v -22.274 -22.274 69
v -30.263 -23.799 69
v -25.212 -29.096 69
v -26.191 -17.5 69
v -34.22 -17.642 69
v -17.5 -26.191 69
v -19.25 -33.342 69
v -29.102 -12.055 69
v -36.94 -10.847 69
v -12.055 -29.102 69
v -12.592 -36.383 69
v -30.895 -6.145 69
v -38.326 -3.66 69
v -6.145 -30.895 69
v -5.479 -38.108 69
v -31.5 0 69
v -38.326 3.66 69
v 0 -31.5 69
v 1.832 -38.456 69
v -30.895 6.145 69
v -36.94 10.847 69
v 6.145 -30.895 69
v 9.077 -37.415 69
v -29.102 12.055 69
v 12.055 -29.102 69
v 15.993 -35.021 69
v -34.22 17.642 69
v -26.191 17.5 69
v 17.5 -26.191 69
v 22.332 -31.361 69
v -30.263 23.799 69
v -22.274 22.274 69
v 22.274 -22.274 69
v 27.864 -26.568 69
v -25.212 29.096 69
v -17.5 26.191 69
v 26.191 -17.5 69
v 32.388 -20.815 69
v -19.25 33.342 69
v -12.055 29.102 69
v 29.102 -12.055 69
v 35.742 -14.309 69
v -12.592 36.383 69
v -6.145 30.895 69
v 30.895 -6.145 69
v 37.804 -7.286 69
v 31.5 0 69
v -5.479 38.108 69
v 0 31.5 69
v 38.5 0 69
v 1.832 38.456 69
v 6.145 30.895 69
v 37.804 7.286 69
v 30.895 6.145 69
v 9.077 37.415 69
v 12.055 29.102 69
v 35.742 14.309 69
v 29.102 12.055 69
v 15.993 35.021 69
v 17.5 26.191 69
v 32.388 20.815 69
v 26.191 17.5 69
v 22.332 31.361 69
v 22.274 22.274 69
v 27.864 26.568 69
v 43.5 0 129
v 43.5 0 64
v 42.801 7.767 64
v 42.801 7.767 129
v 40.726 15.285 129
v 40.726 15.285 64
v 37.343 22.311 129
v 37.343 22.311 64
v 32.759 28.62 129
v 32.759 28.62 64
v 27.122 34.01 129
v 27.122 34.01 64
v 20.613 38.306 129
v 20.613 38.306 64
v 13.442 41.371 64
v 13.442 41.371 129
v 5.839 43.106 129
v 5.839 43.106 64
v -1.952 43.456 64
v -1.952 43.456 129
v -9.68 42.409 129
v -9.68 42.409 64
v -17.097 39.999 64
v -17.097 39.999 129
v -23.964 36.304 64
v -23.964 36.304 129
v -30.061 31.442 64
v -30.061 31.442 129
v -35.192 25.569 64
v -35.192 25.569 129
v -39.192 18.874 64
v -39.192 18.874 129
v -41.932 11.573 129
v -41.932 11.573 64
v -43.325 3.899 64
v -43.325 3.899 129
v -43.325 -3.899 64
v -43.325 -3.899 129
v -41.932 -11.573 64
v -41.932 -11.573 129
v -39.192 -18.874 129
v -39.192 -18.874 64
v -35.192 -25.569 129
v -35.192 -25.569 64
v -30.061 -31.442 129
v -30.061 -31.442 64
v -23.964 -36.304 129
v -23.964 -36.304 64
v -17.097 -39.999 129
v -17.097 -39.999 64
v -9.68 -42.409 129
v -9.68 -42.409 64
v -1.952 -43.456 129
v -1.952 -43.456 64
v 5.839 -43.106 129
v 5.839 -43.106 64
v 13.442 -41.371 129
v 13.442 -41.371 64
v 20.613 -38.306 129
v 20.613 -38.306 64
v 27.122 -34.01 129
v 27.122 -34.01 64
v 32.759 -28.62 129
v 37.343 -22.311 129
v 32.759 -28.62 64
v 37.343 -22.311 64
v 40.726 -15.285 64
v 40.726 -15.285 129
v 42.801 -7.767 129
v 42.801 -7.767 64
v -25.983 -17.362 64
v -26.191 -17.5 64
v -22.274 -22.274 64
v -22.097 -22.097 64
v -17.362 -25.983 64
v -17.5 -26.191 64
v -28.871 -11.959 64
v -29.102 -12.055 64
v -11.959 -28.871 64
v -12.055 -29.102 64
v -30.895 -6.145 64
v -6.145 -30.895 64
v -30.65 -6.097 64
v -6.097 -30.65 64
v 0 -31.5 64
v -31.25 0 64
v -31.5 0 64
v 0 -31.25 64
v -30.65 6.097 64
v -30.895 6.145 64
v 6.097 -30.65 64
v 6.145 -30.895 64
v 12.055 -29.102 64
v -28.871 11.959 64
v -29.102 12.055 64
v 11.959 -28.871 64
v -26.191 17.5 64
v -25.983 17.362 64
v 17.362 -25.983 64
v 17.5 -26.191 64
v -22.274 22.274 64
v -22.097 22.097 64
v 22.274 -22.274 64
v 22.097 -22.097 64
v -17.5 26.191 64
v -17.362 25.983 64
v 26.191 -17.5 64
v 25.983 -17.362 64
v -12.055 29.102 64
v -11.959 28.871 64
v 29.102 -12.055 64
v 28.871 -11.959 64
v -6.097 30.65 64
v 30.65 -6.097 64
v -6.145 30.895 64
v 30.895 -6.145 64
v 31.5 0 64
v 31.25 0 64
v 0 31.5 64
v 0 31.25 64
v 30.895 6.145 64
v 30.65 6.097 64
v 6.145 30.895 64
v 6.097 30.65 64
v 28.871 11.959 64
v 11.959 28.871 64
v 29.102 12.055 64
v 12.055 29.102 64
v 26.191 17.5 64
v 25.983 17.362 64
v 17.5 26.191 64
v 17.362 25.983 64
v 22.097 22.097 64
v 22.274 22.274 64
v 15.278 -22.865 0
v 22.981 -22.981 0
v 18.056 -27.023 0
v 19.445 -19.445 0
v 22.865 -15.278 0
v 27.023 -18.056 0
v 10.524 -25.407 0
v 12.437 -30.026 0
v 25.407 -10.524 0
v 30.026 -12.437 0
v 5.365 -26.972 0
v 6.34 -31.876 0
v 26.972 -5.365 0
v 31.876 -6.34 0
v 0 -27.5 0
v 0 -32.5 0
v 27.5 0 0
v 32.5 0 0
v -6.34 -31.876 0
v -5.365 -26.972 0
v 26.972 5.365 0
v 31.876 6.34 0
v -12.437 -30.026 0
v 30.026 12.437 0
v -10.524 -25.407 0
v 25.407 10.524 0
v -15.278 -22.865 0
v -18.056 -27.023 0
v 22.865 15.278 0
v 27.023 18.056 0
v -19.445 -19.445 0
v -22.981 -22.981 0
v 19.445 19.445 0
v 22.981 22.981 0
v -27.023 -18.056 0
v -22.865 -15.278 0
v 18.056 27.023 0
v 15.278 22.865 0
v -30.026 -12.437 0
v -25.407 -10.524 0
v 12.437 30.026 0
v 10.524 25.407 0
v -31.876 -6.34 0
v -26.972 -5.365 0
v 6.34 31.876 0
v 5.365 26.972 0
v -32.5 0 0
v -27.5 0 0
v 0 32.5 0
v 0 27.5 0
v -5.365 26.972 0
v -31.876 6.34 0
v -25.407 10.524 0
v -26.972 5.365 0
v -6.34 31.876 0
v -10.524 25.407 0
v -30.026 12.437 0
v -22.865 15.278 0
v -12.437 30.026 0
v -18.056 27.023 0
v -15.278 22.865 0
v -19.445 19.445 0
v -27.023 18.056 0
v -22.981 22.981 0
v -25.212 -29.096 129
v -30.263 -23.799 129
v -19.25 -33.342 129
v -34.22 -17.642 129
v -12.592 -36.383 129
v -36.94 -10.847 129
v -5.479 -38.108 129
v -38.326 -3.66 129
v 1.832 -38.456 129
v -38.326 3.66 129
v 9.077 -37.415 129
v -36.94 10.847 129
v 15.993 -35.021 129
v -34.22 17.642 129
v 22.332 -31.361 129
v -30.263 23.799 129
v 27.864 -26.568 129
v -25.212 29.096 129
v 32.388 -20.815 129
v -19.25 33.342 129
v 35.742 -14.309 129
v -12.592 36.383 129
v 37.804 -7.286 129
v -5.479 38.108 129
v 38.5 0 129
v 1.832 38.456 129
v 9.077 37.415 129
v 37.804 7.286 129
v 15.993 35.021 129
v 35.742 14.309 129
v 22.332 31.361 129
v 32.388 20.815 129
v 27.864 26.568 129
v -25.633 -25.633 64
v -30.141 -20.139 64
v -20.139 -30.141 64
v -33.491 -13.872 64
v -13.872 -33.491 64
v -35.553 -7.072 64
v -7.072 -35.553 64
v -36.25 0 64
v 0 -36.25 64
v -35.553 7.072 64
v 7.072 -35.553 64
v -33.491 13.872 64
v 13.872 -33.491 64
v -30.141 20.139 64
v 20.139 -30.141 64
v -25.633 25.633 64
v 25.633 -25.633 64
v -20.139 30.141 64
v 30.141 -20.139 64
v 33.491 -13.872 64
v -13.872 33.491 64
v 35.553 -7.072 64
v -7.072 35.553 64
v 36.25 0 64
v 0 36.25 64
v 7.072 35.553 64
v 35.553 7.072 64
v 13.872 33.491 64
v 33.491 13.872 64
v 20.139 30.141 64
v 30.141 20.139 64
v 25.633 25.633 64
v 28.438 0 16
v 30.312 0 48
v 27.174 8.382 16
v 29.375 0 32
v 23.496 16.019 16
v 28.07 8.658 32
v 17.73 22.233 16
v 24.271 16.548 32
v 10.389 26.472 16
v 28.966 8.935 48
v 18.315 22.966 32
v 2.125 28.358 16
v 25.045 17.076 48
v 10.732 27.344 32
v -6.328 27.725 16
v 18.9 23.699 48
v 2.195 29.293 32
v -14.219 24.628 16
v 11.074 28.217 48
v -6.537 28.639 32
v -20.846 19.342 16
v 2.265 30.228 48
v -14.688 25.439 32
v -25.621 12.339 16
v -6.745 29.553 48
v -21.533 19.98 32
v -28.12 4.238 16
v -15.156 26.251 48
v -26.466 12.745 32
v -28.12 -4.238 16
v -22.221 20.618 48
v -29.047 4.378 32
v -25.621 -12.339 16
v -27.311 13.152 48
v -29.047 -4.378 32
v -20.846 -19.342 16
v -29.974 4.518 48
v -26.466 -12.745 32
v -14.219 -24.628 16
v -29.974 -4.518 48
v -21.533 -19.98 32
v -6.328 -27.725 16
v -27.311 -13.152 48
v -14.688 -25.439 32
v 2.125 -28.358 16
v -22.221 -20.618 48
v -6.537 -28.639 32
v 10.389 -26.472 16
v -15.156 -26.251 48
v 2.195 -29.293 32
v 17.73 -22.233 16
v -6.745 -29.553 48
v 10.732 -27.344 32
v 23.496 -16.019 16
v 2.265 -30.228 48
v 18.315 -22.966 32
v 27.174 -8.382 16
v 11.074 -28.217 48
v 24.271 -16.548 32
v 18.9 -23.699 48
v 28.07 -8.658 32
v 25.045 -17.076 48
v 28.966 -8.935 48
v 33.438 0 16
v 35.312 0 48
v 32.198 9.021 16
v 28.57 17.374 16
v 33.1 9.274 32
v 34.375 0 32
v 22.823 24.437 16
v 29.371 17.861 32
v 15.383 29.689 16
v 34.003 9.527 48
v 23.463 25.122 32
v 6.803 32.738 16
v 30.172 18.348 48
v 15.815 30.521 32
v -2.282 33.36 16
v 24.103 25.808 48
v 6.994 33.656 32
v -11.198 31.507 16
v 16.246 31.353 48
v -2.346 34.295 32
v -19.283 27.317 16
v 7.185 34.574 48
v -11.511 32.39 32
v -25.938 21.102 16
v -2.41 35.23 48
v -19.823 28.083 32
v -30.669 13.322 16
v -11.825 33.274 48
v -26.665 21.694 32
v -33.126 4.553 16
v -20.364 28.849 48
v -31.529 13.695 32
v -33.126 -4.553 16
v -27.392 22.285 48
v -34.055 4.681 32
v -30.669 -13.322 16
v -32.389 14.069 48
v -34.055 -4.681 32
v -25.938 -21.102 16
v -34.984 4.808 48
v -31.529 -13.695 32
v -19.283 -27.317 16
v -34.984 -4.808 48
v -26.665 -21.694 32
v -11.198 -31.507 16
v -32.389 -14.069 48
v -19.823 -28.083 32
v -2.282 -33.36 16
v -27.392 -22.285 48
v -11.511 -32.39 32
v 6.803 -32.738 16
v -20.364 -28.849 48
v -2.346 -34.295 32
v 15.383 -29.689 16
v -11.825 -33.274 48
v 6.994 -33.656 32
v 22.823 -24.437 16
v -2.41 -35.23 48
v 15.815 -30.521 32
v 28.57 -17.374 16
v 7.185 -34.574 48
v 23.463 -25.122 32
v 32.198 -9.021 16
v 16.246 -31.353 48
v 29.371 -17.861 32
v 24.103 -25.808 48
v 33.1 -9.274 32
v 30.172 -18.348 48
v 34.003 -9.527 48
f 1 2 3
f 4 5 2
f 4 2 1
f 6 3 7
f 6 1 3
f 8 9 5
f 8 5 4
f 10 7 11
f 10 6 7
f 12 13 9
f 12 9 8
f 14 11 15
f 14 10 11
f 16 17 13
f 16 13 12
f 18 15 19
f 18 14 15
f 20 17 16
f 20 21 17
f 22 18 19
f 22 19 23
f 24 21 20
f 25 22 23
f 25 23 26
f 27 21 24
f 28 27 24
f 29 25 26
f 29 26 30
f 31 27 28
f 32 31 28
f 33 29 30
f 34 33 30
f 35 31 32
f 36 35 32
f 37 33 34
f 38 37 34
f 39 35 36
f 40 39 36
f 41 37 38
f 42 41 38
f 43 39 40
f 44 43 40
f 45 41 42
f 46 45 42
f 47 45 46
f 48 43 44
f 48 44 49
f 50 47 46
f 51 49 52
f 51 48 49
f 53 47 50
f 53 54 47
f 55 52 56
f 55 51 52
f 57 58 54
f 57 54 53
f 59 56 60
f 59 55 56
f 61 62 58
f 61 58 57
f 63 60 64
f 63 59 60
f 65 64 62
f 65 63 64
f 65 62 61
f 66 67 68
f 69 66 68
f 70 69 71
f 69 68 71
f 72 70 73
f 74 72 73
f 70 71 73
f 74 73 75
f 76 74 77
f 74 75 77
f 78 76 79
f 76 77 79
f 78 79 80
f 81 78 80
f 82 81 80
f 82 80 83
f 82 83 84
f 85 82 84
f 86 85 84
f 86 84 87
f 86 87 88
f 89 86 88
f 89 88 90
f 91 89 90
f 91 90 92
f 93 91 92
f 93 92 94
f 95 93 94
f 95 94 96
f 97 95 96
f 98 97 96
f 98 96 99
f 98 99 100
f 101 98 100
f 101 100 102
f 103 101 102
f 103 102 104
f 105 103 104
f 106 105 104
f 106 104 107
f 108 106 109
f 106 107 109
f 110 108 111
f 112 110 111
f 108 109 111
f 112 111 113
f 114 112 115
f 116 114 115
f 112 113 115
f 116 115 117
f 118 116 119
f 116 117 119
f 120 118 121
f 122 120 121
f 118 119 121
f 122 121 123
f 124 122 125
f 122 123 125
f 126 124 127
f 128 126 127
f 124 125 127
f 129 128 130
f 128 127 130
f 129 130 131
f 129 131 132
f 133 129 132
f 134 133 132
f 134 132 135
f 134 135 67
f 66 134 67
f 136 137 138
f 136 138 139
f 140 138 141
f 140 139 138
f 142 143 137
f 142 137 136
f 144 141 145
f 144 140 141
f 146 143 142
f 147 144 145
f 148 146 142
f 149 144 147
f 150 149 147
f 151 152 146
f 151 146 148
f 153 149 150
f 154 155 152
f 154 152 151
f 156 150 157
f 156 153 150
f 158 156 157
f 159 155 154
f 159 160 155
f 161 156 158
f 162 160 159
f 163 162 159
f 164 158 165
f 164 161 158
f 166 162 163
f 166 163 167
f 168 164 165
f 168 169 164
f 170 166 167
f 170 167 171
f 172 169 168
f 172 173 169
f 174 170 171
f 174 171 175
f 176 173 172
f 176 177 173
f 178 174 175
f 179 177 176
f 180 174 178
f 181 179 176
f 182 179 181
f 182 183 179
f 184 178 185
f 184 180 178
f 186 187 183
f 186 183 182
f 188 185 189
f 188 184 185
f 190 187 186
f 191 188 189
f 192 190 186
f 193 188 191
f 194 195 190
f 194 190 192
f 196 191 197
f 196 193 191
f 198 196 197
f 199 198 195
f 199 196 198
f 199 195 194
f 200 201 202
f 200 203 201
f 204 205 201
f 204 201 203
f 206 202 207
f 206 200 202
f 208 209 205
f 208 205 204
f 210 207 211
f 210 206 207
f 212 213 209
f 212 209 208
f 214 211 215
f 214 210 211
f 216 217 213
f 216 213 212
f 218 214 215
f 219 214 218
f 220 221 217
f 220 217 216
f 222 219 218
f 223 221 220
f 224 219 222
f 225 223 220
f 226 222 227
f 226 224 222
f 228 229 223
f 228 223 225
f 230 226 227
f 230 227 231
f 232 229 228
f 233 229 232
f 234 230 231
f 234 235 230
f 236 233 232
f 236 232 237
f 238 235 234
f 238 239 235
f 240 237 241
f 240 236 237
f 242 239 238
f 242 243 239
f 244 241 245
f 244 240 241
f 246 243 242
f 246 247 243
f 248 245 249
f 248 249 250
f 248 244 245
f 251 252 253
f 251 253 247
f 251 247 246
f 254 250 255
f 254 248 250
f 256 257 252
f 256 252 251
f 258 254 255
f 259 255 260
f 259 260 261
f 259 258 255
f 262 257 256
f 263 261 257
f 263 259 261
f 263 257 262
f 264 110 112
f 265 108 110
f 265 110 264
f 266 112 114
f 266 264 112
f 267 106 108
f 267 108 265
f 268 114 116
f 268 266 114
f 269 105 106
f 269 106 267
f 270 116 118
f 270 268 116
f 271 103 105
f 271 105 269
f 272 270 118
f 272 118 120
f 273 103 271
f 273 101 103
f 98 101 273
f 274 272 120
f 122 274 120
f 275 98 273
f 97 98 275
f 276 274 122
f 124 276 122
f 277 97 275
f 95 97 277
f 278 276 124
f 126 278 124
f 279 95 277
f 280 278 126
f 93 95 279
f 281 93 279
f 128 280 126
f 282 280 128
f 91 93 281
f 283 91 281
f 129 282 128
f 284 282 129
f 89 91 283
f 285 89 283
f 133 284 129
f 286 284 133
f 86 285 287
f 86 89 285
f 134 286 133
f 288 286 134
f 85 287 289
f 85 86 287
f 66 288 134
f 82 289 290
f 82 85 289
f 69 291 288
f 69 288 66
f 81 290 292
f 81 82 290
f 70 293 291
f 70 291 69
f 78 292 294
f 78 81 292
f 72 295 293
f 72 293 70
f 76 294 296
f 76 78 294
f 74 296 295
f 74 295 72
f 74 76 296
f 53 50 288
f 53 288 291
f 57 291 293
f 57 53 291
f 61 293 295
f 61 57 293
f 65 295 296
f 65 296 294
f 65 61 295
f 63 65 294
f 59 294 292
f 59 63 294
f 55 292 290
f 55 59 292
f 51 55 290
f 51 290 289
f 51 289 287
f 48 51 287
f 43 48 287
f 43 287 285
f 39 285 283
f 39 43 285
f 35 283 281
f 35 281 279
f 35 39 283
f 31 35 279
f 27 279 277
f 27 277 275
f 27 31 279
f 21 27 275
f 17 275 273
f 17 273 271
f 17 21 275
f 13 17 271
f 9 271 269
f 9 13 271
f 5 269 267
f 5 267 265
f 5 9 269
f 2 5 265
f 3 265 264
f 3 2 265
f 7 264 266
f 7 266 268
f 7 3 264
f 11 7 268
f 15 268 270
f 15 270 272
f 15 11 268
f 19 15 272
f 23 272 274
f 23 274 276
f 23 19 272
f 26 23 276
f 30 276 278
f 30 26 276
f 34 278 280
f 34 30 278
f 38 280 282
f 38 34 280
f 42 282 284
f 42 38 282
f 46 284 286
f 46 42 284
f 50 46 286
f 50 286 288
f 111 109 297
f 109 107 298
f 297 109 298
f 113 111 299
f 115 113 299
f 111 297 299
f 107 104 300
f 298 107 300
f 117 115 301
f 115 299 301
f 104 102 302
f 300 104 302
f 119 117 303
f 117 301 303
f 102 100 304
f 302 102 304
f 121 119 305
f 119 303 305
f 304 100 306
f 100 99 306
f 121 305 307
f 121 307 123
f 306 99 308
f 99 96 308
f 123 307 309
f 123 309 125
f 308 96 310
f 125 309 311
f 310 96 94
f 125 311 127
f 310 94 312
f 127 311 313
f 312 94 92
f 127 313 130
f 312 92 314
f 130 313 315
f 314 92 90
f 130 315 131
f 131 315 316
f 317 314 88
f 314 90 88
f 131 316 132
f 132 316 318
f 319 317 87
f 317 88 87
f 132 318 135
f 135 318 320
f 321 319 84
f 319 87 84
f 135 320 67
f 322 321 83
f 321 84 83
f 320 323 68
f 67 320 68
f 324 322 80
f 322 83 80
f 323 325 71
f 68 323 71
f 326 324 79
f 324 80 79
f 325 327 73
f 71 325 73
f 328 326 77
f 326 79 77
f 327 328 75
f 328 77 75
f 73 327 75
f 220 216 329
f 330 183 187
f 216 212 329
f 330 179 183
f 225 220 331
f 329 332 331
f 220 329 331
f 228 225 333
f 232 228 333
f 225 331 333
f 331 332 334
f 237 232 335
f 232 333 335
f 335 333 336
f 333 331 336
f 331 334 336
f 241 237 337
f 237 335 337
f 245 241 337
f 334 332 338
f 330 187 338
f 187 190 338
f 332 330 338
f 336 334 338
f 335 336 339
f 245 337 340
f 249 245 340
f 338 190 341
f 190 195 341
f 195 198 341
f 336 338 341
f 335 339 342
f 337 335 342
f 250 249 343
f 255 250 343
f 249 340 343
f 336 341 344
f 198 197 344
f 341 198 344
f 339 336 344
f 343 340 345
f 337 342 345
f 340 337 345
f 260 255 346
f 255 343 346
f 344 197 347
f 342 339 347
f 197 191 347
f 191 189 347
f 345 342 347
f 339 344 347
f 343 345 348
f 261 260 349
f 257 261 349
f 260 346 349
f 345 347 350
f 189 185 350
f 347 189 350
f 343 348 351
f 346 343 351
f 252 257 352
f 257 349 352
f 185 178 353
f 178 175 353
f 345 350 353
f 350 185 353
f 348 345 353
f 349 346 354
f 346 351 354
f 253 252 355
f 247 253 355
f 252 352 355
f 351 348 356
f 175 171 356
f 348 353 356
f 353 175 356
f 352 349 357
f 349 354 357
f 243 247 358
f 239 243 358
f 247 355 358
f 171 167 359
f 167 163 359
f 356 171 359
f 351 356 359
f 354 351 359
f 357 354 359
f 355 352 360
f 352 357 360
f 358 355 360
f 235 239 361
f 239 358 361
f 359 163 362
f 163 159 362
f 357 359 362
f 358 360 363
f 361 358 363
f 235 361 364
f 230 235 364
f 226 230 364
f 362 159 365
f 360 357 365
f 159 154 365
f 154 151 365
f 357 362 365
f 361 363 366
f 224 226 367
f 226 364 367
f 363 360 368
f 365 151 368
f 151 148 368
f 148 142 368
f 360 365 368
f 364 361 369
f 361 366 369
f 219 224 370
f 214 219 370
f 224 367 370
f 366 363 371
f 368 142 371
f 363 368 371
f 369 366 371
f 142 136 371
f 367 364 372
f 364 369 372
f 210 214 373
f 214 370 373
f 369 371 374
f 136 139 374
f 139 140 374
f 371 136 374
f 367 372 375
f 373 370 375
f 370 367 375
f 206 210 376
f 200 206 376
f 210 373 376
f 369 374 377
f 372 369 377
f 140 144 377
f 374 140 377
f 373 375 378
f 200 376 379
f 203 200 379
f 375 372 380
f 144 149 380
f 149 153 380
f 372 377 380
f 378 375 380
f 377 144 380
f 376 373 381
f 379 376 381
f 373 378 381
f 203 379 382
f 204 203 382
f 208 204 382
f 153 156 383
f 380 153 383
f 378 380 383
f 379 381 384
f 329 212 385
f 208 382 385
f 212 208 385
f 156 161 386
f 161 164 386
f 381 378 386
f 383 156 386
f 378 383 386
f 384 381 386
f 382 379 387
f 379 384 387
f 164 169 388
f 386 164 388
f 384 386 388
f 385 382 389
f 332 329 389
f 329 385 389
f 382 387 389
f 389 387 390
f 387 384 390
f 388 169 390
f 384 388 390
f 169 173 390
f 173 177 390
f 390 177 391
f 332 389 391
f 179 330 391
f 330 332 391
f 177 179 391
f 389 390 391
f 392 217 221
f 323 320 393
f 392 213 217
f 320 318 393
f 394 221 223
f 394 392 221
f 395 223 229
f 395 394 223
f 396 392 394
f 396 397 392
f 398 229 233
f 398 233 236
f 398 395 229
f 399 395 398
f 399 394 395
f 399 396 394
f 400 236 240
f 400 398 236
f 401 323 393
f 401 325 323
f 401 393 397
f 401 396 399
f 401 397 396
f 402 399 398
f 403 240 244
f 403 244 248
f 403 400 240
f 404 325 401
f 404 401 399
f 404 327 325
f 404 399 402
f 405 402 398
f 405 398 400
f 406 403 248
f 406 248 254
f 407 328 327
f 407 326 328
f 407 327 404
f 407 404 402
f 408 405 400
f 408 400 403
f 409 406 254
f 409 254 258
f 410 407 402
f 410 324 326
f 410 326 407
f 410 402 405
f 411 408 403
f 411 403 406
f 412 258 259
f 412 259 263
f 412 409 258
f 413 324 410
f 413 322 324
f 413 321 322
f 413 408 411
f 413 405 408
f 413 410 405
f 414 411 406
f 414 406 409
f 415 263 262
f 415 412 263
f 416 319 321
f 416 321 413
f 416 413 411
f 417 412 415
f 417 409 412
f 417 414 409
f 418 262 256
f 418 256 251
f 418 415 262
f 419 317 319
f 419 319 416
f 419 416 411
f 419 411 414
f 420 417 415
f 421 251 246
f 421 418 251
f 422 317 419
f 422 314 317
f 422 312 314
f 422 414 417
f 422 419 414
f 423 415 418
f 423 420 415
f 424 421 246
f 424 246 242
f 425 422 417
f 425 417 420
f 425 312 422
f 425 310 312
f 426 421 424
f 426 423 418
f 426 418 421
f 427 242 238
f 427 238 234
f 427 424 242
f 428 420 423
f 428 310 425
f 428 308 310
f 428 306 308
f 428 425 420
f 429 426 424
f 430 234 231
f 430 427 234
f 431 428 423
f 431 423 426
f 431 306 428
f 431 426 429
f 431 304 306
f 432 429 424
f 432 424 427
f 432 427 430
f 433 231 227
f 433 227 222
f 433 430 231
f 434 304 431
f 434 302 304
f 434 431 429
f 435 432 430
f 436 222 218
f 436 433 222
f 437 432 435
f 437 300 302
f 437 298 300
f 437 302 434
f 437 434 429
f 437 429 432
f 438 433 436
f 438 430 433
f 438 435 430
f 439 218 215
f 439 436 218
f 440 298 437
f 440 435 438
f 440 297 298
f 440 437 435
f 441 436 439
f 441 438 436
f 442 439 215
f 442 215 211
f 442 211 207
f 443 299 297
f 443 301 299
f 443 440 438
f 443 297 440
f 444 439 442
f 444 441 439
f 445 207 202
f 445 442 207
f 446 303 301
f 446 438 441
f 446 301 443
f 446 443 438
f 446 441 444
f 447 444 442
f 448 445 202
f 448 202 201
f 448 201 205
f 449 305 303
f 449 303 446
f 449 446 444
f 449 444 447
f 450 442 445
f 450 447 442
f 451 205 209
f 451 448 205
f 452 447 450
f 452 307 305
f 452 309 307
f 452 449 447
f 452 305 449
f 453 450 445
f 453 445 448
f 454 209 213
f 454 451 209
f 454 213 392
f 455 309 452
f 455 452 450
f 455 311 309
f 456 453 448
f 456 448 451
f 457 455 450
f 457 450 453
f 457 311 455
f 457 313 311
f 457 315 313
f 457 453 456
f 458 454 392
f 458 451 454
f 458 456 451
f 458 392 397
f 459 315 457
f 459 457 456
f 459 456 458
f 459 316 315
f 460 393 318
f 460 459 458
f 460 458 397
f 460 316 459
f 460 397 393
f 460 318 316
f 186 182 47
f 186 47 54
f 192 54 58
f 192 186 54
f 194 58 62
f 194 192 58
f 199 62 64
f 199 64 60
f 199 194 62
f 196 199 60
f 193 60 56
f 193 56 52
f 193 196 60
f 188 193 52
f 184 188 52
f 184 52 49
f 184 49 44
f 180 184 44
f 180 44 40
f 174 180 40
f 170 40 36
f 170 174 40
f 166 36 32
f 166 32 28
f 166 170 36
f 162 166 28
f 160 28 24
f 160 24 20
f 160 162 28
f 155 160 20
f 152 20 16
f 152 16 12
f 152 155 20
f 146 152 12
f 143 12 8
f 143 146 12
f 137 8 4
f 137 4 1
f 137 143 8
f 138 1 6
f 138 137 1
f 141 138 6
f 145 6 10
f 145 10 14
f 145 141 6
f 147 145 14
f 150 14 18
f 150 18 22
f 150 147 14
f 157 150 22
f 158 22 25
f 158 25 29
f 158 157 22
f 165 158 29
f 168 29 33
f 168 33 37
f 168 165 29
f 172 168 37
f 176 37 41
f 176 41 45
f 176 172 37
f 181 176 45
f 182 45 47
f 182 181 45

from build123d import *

# Parameters (mm, degrees)
CYLINDER002_R     = 31.5
CYLINDER002_DEPTH = 5
CYLINDER003_R     = 43.5
CYLINDER003_DEPTH = 5
CYLINDER_R        = 38.5
CYLINDER_DEPTH    = 60
CYLINDER001_R     = 43.5
CYLINDER001_DEPTH = 60


with BuildPart() as interior_cono:
    # Cone → Cone (revolve)
    with BuildSketch(Plane.XZ):
        Polygon((0, 0), (27.5, 0), (31.25, 64), (0, 64), align=None)
    revolve(axis=Axis((0, 0, 0), (0, 0, 1)))


with BuildPart() as cono_inferior:
    # Cone001 → Cone001 (revolve)
    with BuildSketch(Plane.XZ):
        Polygon((0, 0), (32.5, 0), (36.25, 64), (0, 64), align=None)
    revolve(axis=Axis((0, 0, 0), (0, 0, 1)))

    # Cut001: cut Interior_cono
    add(interior_cono.part, mode=Mode.SUBTRACT)


with BuildPart() as interior_cilindor001:
    # Cylinder002 → Cylinder002 (new body)
    with BuildSketch(Plane.XY):
        Circle(CYLINDER002_R)
    extrude(amount=CYLINDER002_DEPTH)


with BuildPart() as anillo_union:
    # Cylinder003 → Cylinder003 (new body)
    with BuildSketch(Plane.XY):
        Circle(CYLINDER003_R)
    extrude(amount=CYLINDER003_DEPTH)

    # Cut002: cut Interior_cilindor001
    add(interior_cilindor001.part, mode=Mode.SUBTRACT)


with BuildPart() as anillo_union_1:
    # Cut002 placement: moved
    add(anillo_union.part.moved(Location((0, 0, 64))))


with BuildPart() as interior_cilindor:
    # Cylinder → Cylinder (new body)
    with BuildSketch(Plane.XY):
        Circle(CYLINDER_R)
    extrude(amount=CYLINDER_DEPTH)


with BuildPart() as parte:
    # Cylinder001 → Cylinder001 (new body)
    with BuildSketch(Plane.XY):
        Circle(CYLINDER001_R)
    extrude(amount=CYLINDER001_DEPTH)

    # Cut: cut Interior_cilindor
    add(interior_cilindor.part, mode=Mode.SUBTRACT)


with BuildPart() as parte_1:
    # Cut placement: moved
    add(parte.part.moved(Location((0, 0, 69))))

    # Fusion: union Cono_inferior, Anillo_Union
    add(cono_inferior.part)
    add(anillo_union_1.part)


solid = parte_1.part
